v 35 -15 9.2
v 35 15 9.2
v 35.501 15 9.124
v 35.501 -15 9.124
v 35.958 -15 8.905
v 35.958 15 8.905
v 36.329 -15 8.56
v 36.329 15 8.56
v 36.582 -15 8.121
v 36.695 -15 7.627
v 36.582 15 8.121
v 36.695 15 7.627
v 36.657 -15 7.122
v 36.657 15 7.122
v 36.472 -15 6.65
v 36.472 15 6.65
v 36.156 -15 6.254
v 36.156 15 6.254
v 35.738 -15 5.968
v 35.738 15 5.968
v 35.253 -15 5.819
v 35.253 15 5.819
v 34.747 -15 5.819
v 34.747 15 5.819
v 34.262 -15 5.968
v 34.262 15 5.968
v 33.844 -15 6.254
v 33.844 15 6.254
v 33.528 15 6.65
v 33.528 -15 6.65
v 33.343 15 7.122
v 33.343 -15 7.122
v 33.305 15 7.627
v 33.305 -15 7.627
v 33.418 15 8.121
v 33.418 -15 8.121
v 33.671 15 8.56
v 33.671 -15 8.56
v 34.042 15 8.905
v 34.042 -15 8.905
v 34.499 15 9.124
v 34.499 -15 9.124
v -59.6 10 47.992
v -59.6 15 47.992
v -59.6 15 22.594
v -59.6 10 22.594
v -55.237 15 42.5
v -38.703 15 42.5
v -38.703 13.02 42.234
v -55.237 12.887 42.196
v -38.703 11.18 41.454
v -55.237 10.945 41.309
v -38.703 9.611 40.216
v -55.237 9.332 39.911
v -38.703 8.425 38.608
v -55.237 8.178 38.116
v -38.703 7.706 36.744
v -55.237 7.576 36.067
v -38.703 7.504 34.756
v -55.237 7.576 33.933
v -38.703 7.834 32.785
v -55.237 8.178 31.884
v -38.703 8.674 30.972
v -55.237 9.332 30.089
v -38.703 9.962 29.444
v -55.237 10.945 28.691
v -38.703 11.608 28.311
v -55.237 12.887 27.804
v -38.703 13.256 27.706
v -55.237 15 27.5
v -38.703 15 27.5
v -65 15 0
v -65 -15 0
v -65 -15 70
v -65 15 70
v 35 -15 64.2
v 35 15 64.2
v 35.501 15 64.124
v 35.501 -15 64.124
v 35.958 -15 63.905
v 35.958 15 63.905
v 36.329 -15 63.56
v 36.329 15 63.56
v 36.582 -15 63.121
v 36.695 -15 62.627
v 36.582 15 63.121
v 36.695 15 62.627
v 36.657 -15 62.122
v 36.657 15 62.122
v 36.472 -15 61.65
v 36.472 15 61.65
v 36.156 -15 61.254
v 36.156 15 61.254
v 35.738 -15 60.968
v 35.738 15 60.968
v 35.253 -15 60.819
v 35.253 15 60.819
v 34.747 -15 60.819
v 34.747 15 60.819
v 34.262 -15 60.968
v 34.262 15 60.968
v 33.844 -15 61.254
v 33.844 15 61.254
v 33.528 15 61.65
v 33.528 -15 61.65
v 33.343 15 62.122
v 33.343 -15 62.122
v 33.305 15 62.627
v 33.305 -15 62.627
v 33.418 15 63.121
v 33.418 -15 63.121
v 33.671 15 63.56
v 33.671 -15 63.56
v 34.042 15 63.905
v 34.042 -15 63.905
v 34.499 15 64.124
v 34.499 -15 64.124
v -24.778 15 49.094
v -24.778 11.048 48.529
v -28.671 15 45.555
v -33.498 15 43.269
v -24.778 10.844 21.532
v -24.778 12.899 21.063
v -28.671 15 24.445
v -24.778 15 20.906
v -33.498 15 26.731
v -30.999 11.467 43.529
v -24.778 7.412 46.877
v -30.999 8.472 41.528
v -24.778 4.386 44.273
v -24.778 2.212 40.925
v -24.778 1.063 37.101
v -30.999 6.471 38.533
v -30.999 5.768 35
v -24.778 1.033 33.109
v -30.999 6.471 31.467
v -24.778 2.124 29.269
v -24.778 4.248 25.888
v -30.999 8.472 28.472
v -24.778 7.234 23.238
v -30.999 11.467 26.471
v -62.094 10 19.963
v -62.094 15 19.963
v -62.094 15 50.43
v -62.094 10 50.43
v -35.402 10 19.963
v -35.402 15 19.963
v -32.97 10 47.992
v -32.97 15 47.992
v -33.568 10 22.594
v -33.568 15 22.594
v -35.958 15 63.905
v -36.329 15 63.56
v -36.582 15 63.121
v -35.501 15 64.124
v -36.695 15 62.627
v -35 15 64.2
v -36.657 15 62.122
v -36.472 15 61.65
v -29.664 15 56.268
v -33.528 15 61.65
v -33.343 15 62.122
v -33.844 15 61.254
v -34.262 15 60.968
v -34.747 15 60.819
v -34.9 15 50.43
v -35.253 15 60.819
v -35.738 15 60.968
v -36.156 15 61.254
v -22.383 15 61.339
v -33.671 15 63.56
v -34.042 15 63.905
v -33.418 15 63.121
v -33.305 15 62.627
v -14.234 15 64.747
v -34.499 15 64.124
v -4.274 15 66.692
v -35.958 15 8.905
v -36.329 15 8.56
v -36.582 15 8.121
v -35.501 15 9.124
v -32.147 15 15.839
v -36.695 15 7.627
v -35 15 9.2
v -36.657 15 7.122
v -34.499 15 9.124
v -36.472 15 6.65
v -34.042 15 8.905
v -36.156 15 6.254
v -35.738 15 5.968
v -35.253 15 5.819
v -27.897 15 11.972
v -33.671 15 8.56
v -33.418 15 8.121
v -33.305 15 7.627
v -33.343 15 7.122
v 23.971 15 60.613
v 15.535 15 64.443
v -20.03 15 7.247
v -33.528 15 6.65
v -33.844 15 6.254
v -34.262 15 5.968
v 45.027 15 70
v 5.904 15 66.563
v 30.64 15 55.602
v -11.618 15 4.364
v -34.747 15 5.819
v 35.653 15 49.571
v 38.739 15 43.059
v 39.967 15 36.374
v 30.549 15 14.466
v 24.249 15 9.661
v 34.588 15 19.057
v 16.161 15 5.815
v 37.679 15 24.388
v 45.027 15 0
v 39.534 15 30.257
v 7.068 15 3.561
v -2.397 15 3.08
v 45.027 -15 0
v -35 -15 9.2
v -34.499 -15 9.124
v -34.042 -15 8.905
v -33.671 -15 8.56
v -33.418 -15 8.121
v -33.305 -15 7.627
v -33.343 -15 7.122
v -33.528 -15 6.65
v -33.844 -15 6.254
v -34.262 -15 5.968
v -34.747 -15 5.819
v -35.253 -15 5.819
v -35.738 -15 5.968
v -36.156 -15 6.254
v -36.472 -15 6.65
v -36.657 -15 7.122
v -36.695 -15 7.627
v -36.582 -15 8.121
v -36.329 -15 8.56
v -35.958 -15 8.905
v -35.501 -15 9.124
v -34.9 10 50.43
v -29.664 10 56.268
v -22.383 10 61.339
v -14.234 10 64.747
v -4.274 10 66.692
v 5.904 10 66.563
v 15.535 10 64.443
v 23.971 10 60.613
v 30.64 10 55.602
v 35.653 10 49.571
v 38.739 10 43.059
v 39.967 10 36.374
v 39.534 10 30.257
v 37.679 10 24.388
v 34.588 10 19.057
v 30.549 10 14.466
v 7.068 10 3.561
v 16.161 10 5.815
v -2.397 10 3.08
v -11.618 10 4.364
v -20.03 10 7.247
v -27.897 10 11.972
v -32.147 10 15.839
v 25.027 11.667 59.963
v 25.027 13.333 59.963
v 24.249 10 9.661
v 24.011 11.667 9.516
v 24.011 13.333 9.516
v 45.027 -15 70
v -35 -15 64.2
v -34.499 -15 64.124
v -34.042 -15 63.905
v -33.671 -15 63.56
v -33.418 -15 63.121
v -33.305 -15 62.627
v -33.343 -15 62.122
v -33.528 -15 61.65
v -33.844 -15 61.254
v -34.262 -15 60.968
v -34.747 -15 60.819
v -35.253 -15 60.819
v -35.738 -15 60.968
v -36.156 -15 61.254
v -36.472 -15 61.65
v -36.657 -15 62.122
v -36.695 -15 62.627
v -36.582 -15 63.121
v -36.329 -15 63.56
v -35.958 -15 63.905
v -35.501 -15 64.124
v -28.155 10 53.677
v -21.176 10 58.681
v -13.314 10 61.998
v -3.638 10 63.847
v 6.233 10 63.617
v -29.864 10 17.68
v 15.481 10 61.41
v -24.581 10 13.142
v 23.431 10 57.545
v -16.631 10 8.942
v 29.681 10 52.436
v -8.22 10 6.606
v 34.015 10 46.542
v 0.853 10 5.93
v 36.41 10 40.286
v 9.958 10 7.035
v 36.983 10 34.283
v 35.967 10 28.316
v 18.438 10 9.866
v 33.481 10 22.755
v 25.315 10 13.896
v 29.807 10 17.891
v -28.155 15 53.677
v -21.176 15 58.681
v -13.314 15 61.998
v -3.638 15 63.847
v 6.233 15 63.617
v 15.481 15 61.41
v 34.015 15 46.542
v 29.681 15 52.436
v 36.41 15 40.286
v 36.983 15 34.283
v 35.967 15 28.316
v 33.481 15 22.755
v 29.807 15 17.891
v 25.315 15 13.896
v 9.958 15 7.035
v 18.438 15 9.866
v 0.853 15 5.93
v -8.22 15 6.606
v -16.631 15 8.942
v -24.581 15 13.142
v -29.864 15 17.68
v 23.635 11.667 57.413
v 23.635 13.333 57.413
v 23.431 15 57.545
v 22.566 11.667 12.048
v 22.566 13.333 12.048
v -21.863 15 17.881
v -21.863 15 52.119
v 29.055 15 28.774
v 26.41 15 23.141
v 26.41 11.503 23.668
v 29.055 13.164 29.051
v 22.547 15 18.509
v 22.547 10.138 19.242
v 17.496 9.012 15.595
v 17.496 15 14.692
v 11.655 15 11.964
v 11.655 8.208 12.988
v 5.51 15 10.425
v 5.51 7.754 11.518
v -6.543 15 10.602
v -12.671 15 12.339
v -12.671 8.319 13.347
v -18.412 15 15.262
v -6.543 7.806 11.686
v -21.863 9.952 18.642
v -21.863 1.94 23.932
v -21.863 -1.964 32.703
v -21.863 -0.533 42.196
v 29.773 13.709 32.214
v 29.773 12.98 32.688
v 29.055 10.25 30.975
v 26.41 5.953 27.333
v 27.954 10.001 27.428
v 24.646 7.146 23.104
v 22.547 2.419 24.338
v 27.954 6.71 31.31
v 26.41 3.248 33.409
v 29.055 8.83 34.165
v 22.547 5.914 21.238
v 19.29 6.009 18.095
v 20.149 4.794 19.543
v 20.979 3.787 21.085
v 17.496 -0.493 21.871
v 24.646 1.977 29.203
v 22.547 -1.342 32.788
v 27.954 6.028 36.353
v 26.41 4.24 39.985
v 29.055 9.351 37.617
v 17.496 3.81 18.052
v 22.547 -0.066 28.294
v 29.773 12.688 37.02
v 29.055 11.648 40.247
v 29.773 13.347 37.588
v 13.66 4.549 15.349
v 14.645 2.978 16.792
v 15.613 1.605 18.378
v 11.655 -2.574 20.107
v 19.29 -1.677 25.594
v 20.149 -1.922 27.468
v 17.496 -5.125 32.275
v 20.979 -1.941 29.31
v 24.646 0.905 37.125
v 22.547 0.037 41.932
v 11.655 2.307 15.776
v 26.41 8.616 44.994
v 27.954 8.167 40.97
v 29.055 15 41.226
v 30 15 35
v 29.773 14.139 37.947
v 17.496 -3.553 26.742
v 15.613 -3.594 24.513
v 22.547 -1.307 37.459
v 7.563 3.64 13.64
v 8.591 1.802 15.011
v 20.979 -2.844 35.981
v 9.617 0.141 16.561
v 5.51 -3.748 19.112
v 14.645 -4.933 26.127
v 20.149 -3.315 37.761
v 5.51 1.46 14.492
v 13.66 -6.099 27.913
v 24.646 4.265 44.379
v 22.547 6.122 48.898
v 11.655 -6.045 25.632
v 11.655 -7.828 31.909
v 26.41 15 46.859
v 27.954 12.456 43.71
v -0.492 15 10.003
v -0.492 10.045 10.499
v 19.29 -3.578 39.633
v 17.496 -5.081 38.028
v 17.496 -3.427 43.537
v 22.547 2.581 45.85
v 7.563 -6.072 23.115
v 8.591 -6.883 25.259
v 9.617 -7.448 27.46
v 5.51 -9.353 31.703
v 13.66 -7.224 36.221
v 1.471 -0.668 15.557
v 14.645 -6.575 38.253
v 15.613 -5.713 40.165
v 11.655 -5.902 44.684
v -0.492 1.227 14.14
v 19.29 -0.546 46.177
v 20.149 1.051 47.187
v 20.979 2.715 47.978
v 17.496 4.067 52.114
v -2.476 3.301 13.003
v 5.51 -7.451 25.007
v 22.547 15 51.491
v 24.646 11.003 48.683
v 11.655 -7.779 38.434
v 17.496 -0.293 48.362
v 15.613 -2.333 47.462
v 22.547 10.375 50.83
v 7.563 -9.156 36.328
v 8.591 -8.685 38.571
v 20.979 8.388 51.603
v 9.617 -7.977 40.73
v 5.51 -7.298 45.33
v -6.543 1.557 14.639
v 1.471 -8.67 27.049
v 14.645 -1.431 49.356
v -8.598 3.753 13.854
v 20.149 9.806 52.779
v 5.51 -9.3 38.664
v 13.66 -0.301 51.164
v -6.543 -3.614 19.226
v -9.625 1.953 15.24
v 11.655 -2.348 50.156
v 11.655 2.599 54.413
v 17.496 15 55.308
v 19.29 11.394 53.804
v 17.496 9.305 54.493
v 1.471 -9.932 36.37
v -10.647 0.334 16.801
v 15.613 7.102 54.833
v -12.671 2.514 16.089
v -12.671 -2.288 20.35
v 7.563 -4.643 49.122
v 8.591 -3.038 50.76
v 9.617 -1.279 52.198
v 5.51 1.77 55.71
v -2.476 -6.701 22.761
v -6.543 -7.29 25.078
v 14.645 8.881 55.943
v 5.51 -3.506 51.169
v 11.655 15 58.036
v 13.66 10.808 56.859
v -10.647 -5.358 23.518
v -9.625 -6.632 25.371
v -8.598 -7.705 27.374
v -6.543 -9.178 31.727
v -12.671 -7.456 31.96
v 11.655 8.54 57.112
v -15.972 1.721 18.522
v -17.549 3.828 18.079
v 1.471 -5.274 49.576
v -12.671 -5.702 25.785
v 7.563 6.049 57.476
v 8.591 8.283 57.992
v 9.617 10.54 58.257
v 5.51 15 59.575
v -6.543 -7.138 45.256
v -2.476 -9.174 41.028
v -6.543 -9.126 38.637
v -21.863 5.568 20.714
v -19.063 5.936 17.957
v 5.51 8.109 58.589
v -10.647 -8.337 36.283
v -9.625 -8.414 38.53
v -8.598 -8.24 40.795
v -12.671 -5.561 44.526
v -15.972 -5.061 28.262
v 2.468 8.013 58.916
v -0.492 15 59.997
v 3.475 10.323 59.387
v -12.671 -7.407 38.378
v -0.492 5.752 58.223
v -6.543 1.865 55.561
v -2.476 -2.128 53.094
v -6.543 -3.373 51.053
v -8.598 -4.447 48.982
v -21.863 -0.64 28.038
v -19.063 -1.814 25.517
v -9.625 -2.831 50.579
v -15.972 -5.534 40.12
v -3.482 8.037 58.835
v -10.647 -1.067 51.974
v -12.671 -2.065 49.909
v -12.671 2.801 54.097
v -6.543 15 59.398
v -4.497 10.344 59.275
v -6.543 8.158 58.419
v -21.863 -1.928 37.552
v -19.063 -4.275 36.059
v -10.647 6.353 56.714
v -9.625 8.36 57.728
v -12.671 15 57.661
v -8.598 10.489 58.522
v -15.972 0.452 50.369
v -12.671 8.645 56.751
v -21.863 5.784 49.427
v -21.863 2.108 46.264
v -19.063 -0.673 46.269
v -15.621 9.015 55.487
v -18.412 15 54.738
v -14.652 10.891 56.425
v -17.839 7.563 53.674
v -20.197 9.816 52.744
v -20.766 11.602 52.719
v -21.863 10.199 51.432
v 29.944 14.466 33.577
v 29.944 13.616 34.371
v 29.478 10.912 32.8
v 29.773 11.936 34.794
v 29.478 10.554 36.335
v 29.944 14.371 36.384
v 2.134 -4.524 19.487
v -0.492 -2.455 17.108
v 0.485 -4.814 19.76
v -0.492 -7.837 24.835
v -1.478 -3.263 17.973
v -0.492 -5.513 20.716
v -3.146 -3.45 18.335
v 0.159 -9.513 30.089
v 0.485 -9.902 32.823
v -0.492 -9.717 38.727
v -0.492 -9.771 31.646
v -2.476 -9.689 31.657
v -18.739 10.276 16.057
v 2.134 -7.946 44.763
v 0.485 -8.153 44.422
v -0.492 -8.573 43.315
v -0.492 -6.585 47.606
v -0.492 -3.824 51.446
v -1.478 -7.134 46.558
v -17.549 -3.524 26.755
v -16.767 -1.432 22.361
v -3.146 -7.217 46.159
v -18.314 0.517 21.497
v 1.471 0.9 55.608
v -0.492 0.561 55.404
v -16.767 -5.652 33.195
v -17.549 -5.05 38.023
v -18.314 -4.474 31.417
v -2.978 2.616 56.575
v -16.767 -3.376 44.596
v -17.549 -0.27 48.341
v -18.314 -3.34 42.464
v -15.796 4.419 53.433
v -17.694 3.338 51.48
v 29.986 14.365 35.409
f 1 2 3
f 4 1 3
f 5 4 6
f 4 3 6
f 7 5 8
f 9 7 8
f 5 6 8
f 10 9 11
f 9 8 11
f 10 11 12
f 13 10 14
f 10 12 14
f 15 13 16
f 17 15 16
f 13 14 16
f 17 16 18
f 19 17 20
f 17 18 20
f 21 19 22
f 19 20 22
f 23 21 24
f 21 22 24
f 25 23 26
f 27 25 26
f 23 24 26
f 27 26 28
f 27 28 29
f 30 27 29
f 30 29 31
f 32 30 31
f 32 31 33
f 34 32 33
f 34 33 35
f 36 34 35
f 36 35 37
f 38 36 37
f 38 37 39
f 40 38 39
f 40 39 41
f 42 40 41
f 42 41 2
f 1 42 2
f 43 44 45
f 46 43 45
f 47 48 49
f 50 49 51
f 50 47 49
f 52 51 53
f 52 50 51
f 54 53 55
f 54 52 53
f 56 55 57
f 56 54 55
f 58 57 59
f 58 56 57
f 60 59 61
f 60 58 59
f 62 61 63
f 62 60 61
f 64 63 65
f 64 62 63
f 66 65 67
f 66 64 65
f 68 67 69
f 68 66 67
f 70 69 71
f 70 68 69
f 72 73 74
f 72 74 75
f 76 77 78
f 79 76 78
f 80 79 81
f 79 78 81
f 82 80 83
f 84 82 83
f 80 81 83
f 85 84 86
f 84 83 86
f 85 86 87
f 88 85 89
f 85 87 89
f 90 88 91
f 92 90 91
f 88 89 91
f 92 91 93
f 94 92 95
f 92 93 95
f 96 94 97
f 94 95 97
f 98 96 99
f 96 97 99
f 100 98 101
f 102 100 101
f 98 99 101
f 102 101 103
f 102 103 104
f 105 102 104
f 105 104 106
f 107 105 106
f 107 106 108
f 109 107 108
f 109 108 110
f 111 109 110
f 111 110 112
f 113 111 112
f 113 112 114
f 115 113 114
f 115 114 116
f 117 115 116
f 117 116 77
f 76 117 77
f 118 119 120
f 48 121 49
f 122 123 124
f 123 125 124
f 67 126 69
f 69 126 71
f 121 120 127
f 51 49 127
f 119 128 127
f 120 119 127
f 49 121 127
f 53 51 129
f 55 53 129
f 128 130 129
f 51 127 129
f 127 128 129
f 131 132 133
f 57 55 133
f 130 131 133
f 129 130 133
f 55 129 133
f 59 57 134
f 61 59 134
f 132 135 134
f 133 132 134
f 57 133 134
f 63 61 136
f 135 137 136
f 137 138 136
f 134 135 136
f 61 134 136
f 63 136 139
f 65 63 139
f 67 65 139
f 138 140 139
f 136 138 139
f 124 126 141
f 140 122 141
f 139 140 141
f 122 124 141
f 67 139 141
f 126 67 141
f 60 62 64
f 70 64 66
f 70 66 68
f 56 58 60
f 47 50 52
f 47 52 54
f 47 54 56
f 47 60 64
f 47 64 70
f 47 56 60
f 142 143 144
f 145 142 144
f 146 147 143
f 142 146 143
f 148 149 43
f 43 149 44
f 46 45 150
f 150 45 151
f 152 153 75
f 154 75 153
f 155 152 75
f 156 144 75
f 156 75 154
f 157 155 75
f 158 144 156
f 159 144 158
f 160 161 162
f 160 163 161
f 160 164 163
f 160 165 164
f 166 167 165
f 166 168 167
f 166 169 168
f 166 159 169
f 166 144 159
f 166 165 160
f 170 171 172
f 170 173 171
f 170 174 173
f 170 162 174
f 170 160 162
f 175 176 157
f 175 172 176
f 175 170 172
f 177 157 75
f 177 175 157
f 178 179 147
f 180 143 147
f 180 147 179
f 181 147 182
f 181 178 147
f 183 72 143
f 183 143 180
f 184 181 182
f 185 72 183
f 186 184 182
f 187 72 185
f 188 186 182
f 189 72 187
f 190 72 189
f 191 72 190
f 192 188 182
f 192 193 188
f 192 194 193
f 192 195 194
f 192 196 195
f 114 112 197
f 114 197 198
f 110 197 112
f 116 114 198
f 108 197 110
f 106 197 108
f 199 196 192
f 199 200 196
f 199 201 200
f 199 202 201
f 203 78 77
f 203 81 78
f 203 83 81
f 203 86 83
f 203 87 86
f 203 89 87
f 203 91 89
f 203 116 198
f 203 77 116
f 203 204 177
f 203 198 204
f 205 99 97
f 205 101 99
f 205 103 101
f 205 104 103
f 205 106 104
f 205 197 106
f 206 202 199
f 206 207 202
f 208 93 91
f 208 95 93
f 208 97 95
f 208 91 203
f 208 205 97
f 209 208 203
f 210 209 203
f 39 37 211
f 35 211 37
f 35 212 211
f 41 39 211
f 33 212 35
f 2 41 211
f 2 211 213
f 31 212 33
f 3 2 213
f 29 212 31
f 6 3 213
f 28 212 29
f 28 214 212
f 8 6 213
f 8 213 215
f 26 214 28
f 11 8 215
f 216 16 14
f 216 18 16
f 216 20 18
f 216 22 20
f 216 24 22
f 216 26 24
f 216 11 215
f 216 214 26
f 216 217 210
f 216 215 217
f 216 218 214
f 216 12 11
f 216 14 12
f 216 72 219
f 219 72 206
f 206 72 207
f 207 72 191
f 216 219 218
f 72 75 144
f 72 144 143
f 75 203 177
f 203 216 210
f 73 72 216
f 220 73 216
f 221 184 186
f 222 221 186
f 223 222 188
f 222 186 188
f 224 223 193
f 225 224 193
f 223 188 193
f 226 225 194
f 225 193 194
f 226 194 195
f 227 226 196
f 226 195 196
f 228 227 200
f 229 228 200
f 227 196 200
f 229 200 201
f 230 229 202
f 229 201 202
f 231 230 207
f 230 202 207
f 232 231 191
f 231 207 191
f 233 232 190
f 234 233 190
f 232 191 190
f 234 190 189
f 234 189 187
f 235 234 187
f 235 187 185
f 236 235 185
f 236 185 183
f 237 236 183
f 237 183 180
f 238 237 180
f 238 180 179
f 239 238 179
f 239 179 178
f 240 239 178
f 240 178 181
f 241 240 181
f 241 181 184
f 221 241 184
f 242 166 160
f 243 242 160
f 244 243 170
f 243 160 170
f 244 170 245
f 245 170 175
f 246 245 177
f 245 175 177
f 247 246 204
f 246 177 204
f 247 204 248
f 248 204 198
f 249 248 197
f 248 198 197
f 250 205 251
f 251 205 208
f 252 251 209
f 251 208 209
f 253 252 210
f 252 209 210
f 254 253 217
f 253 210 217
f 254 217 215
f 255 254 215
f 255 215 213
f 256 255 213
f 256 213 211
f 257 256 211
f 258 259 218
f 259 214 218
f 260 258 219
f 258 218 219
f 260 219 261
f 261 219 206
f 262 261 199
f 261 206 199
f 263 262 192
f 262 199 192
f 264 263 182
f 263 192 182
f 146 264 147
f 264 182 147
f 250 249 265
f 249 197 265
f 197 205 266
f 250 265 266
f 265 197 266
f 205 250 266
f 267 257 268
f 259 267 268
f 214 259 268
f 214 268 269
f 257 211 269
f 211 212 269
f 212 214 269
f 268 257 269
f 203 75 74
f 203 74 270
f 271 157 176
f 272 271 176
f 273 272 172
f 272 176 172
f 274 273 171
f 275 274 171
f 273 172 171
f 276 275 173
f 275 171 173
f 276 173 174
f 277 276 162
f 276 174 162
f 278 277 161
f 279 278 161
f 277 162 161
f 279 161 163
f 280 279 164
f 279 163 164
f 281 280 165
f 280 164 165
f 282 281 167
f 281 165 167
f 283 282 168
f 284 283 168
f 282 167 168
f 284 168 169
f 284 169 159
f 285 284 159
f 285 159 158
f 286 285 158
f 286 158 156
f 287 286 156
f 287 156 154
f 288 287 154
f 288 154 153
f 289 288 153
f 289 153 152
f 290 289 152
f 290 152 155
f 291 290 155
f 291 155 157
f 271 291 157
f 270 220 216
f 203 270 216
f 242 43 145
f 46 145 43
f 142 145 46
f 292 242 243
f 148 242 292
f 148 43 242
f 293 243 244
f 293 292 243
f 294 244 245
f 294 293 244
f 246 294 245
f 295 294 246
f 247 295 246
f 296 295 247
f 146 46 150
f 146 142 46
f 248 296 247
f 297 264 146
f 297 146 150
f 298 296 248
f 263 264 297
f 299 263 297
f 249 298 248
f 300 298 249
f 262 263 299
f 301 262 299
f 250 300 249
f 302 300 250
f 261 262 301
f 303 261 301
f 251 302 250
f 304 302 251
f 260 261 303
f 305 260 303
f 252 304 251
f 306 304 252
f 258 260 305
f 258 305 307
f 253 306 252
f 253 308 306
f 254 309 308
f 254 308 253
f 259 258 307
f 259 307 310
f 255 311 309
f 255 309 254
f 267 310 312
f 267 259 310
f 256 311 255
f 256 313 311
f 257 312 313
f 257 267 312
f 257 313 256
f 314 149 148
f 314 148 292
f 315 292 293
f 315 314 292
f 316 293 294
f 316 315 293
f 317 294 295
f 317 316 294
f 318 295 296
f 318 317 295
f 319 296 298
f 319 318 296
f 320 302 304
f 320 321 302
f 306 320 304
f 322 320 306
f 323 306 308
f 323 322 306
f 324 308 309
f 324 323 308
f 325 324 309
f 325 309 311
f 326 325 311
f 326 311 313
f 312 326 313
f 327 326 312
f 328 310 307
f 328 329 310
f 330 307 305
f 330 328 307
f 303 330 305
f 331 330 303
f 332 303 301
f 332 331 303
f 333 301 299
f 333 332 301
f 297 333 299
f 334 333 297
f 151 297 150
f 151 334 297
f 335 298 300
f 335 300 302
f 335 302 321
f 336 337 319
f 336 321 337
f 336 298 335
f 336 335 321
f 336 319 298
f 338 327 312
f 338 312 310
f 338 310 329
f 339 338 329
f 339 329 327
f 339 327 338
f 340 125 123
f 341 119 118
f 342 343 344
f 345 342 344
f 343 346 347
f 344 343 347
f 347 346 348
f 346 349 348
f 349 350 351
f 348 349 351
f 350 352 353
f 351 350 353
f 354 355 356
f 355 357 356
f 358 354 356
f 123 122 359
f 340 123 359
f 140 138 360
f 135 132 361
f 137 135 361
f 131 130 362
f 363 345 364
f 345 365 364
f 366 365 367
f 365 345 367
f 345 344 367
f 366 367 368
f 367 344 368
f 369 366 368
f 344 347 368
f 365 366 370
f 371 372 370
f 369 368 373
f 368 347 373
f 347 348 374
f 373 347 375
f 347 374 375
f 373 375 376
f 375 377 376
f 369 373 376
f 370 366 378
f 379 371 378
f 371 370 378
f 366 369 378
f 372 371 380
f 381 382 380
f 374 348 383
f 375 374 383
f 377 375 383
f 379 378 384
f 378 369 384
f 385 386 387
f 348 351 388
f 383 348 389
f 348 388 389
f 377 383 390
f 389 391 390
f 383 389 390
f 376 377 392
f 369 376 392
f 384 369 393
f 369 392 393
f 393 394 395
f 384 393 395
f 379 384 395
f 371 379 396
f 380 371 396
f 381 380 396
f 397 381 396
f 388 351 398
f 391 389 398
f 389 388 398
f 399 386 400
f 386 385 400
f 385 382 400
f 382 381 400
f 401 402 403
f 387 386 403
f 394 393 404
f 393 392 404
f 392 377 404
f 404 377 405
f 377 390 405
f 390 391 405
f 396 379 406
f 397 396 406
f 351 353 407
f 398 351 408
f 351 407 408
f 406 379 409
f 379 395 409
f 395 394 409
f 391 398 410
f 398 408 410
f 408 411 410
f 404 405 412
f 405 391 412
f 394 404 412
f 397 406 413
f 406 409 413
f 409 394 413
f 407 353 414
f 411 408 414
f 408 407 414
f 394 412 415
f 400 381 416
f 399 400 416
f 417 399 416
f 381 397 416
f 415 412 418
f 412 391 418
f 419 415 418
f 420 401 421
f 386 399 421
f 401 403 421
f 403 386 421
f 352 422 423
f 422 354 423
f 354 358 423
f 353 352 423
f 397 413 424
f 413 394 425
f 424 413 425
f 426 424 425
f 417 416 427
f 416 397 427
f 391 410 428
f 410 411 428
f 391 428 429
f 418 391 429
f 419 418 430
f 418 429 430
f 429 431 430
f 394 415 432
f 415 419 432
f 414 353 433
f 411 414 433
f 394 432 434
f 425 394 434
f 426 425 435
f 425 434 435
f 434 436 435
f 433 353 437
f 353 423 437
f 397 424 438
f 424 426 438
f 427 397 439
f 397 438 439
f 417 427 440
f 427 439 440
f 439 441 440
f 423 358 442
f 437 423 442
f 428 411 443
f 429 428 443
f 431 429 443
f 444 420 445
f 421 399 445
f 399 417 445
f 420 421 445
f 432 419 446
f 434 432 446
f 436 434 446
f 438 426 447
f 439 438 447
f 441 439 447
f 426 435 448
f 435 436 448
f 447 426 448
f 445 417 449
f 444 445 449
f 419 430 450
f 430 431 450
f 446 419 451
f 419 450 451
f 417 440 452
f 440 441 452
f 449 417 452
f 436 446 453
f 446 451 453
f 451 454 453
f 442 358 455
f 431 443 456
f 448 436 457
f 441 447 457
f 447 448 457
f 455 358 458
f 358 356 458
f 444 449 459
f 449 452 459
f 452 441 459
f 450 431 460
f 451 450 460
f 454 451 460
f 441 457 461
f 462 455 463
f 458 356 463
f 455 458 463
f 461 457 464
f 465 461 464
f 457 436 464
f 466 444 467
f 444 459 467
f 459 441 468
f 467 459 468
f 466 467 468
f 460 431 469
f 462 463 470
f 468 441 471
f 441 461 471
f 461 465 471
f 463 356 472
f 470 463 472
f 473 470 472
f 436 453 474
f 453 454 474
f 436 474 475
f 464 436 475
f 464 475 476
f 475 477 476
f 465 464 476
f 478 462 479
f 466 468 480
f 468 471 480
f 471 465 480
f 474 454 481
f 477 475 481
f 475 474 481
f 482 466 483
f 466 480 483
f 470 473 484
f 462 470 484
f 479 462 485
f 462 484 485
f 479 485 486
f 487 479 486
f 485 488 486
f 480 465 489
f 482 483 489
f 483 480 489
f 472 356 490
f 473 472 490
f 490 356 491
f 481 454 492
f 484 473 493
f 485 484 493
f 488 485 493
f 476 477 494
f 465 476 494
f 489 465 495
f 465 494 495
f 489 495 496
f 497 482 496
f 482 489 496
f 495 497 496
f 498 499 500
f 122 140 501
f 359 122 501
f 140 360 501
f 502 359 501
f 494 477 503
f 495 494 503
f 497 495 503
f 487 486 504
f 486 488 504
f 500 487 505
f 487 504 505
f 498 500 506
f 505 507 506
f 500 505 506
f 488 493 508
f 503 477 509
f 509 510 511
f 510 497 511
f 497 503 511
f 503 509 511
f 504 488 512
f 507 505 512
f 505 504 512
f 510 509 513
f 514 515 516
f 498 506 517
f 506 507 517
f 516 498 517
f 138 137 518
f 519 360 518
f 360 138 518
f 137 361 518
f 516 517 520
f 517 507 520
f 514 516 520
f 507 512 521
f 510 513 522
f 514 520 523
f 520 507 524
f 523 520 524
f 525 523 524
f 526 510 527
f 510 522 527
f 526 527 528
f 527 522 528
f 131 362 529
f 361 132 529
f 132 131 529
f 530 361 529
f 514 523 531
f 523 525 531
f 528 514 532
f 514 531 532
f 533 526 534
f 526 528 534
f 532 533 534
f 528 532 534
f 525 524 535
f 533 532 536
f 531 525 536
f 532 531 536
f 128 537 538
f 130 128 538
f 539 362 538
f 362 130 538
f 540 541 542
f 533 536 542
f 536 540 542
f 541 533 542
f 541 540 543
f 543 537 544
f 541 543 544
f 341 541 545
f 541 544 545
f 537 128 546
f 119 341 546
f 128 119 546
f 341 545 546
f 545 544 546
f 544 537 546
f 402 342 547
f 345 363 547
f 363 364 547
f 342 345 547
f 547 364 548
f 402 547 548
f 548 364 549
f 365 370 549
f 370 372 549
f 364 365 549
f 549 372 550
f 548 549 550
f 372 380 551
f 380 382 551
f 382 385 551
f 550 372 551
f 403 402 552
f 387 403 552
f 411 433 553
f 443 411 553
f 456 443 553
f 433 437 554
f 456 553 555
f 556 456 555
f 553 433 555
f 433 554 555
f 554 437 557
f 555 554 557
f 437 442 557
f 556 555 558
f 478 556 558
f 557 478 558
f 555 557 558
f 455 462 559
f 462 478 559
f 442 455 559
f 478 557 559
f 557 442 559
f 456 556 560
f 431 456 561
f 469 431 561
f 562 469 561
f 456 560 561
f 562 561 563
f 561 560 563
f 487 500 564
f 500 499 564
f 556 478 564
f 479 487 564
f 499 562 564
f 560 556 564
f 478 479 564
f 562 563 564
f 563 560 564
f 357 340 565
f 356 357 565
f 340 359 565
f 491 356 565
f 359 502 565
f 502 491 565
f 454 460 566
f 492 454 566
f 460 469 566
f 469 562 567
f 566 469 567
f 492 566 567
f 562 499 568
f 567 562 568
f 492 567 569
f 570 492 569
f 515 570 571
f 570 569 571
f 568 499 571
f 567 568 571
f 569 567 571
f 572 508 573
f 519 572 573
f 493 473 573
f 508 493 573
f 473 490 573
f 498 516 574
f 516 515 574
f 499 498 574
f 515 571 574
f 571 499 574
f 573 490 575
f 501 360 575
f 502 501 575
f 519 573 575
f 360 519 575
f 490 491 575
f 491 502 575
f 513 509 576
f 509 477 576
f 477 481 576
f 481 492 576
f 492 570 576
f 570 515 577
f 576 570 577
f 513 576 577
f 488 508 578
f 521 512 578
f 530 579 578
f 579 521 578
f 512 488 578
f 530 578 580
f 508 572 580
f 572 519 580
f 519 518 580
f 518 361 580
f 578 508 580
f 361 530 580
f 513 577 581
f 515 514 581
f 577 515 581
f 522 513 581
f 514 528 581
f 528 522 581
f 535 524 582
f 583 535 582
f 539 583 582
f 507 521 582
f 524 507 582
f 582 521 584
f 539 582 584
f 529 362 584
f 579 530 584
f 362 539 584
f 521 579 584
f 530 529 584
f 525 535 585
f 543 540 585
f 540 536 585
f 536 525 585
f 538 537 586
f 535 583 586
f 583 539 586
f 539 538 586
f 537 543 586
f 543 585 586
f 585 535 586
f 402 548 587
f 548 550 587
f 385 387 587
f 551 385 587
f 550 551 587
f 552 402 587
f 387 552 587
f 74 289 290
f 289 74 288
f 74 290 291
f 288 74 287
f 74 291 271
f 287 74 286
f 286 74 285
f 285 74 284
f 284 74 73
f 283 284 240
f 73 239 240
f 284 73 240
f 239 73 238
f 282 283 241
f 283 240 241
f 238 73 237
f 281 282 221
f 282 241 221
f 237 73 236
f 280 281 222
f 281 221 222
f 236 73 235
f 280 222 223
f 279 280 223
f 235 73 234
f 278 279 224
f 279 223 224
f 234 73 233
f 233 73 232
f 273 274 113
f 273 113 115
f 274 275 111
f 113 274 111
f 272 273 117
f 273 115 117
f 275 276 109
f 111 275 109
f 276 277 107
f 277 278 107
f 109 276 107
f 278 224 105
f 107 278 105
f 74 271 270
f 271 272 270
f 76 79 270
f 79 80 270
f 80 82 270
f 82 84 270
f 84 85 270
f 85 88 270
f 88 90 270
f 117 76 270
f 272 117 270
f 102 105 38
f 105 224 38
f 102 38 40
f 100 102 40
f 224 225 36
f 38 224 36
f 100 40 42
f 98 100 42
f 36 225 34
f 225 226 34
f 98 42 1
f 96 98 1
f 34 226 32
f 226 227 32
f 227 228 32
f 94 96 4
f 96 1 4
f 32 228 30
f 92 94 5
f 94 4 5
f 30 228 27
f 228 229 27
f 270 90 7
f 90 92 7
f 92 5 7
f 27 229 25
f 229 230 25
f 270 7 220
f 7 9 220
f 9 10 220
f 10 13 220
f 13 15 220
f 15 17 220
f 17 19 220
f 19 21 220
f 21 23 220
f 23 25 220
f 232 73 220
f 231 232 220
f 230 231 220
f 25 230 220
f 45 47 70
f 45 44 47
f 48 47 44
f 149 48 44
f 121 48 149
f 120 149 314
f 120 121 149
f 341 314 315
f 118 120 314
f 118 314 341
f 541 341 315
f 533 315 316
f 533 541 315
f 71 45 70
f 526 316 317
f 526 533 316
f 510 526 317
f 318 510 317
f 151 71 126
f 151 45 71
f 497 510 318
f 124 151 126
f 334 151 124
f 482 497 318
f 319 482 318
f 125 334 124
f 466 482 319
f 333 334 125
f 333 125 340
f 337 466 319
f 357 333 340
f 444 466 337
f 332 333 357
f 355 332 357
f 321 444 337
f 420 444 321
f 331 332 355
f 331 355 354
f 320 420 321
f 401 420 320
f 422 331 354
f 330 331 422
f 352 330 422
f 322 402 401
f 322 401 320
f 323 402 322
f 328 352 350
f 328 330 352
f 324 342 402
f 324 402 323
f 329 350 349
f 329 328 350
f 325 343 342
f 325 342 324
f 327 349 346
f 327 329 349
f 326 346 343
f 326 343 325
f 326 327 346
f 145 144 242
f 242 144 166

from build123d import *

# Parameters (mm, degrees)
ESQUISSE1_W                              = 130
ESQUISSE1_H                              = 30
BOSS_EXTRU_1_DEPTH                       = 70
ENL_VEMENT_DE_MATI_RE_R_VOLUTION47_ANGLE = 180
ENL_VEMENT_START                         = -55.237277286
ENL_VEMENT_DE_MATI_RE_R_VOLUTION48_DEPTH = 26.619101243
CONG_1_R                                 = 18
ESQUISSE10_W                             = 19.973037842
ESQUISSE10_H                             = 30
ENL_V_MAT_EXTRU_2_DEPTH                  = 97.695398184
ENL_V_MAT_EXTRU_5_DEPTH                  = 5
ESQUISSE15_R                             = 1.7
ENL_V_MAT_EXTRU_7_DEPTH                  = 101.124922107


# Read off the part's stored shape, not the designer's step: Enlèvement de matière-Révolution48
with BuildPart() as part:
    # Esquisse1 → Boss.-Extru.1 (new body)
    with BuildSketch(Plane.XY):
        Rectangle(ESQUISSE1_W, ESQUISSE1_H)
    extrude(amount=BOSS_EXTRU_1_DEPTH)

    # Esquisse6 → Enlèvement de matière-Révolution47 (revolve, cut)
    with BuildSketch(Plane(origin=(0, 15, 0), x_dir=(1, 0, 0), z_dir=(0, 1, 0))):
        with BuildLine():
            Line((-30, -35), (30, -35))
            add(Edge.make_bspline(
                [(30, -35), (30, -10), (0, -10), (-30, -10), (-30, -35)],
                knots=[0, 0, 0, 1.570796327, 1.570796327, 3.141592654, 3.141592654, 3.141592654], degree=2, weights=[1, 0.707106781, 1, 0.707106781, 1]))
        make_face()
    revolve(axis=Axis((65, 15, 35), (-1, 0, 0)), revolution_arc=ENL_VEMENT_DE_MATI_RE_R_VOLUTION47_ANGLE, mode=Mode.SUBTRACT)

    # Enlèvement de matière-Révolution48 outli → Enlèvement de matière-Révolution48 (cut)
    with BuildSketch(Plane.YZ.offset(ENL_VEMENT_START)):
        with BuildLine():
            Line((15, 27.5), (15, 42.5))
            ThreePointArc((15, 42.5), (7.5, 35), (15, 27.5))
        make_face()
    extrude(amount=ENL_VEMENT_DE_MATI_RE_R_VOLUTION48_DEPTH, mode=Mode.SUBTRACT)

    # Congé1
    cong_1_edges = [part.edges().sort_by_distance(p)[0] for p in [
        (-28.618176043, 7.5, 35),
    ]]
    fillet(cong_1_edges, radius=CONG_1_R)

    # Esquisse10 → Enlèv. mat.-Extru.2 (cut, through all)
    with BuildSketch(Plane(origin=(0, 0, 0), x_dir=(-1, 0, 0), z_dir=(0, 0, -1))):
        with Locations((-55.013481079, 0)):
            Rectangle(ESQUISSE10_W, ESQUISSE10_H)
    extrude(amount=-ENL_V_MAT_EXTRU_2_DEPTH, mode=Mode.SUBTRACT)

    # Esquisse14 → Enlèv. mat.-Extru.5 (cut)
    with BuildSketch(Plane(origin=(0, 15, 0), x_dir=(1, 0, 0), z_dir=(0, 1, 0))):
        with BuildLine():
            Line((-36.95065792, -22.593731953), (-33.568216071, -22.593731953))
            add(Edge.make_bspline(
                [(-32.969763, -47.992109896), (-11.968044376, -80.456384186), (23.634832969, -57.413436774), (59.237710315, -34.370489362), (22.565908506, -12.048229698), (-14.105893303, 10.274029966), (-33.568216071, -22.593731953)],
                knots=[3.621962513, 3.621962513, 3.621962513, 5.414642661, 5.414642661, 7.207322809, 7.207322809, 9.000002957, 9.000002957, 9.000002957], degree=2, weights=[1, 0.624472717, 1, 0.624472717, 1, 0.624472717, 1]))
            Line((-32.969763, -47.992109896), (-36.439122288, -47.992109896))
            add(Edge.make_bspline(
                [(-36.439122288, -47.992109896), (-35.734455038, -49.237206185), (-34.899635372, -50.4303054)],
                knots=[3.575076272, 3.575076272, 3.575076272, 3.671550289, 3.671550289, 3.671550289], degree=2, weights=[1, 0.979509213, 0.961188751]))
            add(Edge.make_bspline(
                [(-34.899635372, -50.4303054), (-11.819428822, -83.415843998), (25.026969924, -59.963213412), (65.234193612, -34.371427073), (24.010934913, -9.515816182), (-13.543091018, 13.127426623), (-35.401513383, -19.963295045)],
                knots=[3.671550289, 3.671550289, 3.671550289, 5.396765185, 5.396765185, 7.218454098, 7.218454098, 8.937188842, 8.937188842, 8.937188842], degree=2, weights=[0.961188751, 0.633569616, 1, 0.613078829, 1, 0.634945981, 0.958737375]))
            add(Edge.make_bspline(
                [(-35.401513383, -19.963295045), (-36.251462308, -21.250003794), (-36.95065792, -22.593731953)],
                knots=[8.937188842, 8.937188842, 8.937188842, 9.04014301, 9.04014301, 9.04014301], degree=2, weights=[0.958737375, 0.978132848, 1]))
        make_face()
        with BuildLine():
            Line((-59.600015614, -22.593731953), (-36.95065792, -22.593731953))
            add(Edge.make_bspline(
                [(-35.401513383, -19.963295045), (-36.251462308, -21.250003794), (-36.95065792, -22.593731953)],
                knots=[8.937188842, 8.937188842, 8.937188842, 9.04014301, 9.04014301, 9.04014301], degree=2, weights=[0.958737375, 0.978132848, 1]))
            Line((-35.401513383, -19.963295045), (-62.094279206, -19.963295045))
            Line((-62.094279206, -19.963295045), (-62.094279206, -50.4303054))
            Line((-62.094279206, -50.4303054), (-34.899635372, -50.4303054))
            add(Edge.make_bspline(
                [(-36.439122288, -47.992109896), (-35.734455038, -49.237206185), (-34.899635372, -50.4303054)],
                knots=[3.575076272, 3.575076272, 3.575076272, 3.671550289, 3.671550289, 3.671550289], degree=2, weights=[1, 0.979509213, 0.961188751]))
            Line((-36.439122288, -47.992109896), (-59.600015614, -47.992109896))
            Line((-59.600015614, -47.992109896), (-59.600015614, -22.593731953))
        make_face()
    extrude(amount=-ENL_V_MAT_EXTRU_5_DEPTH, mode=Mode.SUBTRACT)

    # Esquisse15 → Enlèv. mat.-Extru.7 (cut, through all)
    with BuildSketch(Plane(origin=(0, 15, 0), x_dir=(1, 0, 0), z_dir=(0, 1, 0))):
        with Locations(Location((35, -7.5, 0), (0, 0, 270))):
            Circle(ESQUISSE15_R)
        with Locations(Location((35, -62.5, 0), (0, 0, 270))):
            Circle(ESQUISSE15_R)
        with Locations(Location((-35, -62.5, 0), (0, 0, 270))):
            Circle(ESQUISSE15_R)
        with Locations(Location((-35, -7.5, 0), (0, 0, 270))):
            Circle(ESQUISSE15_R)
    extrude(amount=-ENL_V_MAT_EXTRU_7_DEPTH, mode=Mode.SUBTRACT)


solid = part.part
